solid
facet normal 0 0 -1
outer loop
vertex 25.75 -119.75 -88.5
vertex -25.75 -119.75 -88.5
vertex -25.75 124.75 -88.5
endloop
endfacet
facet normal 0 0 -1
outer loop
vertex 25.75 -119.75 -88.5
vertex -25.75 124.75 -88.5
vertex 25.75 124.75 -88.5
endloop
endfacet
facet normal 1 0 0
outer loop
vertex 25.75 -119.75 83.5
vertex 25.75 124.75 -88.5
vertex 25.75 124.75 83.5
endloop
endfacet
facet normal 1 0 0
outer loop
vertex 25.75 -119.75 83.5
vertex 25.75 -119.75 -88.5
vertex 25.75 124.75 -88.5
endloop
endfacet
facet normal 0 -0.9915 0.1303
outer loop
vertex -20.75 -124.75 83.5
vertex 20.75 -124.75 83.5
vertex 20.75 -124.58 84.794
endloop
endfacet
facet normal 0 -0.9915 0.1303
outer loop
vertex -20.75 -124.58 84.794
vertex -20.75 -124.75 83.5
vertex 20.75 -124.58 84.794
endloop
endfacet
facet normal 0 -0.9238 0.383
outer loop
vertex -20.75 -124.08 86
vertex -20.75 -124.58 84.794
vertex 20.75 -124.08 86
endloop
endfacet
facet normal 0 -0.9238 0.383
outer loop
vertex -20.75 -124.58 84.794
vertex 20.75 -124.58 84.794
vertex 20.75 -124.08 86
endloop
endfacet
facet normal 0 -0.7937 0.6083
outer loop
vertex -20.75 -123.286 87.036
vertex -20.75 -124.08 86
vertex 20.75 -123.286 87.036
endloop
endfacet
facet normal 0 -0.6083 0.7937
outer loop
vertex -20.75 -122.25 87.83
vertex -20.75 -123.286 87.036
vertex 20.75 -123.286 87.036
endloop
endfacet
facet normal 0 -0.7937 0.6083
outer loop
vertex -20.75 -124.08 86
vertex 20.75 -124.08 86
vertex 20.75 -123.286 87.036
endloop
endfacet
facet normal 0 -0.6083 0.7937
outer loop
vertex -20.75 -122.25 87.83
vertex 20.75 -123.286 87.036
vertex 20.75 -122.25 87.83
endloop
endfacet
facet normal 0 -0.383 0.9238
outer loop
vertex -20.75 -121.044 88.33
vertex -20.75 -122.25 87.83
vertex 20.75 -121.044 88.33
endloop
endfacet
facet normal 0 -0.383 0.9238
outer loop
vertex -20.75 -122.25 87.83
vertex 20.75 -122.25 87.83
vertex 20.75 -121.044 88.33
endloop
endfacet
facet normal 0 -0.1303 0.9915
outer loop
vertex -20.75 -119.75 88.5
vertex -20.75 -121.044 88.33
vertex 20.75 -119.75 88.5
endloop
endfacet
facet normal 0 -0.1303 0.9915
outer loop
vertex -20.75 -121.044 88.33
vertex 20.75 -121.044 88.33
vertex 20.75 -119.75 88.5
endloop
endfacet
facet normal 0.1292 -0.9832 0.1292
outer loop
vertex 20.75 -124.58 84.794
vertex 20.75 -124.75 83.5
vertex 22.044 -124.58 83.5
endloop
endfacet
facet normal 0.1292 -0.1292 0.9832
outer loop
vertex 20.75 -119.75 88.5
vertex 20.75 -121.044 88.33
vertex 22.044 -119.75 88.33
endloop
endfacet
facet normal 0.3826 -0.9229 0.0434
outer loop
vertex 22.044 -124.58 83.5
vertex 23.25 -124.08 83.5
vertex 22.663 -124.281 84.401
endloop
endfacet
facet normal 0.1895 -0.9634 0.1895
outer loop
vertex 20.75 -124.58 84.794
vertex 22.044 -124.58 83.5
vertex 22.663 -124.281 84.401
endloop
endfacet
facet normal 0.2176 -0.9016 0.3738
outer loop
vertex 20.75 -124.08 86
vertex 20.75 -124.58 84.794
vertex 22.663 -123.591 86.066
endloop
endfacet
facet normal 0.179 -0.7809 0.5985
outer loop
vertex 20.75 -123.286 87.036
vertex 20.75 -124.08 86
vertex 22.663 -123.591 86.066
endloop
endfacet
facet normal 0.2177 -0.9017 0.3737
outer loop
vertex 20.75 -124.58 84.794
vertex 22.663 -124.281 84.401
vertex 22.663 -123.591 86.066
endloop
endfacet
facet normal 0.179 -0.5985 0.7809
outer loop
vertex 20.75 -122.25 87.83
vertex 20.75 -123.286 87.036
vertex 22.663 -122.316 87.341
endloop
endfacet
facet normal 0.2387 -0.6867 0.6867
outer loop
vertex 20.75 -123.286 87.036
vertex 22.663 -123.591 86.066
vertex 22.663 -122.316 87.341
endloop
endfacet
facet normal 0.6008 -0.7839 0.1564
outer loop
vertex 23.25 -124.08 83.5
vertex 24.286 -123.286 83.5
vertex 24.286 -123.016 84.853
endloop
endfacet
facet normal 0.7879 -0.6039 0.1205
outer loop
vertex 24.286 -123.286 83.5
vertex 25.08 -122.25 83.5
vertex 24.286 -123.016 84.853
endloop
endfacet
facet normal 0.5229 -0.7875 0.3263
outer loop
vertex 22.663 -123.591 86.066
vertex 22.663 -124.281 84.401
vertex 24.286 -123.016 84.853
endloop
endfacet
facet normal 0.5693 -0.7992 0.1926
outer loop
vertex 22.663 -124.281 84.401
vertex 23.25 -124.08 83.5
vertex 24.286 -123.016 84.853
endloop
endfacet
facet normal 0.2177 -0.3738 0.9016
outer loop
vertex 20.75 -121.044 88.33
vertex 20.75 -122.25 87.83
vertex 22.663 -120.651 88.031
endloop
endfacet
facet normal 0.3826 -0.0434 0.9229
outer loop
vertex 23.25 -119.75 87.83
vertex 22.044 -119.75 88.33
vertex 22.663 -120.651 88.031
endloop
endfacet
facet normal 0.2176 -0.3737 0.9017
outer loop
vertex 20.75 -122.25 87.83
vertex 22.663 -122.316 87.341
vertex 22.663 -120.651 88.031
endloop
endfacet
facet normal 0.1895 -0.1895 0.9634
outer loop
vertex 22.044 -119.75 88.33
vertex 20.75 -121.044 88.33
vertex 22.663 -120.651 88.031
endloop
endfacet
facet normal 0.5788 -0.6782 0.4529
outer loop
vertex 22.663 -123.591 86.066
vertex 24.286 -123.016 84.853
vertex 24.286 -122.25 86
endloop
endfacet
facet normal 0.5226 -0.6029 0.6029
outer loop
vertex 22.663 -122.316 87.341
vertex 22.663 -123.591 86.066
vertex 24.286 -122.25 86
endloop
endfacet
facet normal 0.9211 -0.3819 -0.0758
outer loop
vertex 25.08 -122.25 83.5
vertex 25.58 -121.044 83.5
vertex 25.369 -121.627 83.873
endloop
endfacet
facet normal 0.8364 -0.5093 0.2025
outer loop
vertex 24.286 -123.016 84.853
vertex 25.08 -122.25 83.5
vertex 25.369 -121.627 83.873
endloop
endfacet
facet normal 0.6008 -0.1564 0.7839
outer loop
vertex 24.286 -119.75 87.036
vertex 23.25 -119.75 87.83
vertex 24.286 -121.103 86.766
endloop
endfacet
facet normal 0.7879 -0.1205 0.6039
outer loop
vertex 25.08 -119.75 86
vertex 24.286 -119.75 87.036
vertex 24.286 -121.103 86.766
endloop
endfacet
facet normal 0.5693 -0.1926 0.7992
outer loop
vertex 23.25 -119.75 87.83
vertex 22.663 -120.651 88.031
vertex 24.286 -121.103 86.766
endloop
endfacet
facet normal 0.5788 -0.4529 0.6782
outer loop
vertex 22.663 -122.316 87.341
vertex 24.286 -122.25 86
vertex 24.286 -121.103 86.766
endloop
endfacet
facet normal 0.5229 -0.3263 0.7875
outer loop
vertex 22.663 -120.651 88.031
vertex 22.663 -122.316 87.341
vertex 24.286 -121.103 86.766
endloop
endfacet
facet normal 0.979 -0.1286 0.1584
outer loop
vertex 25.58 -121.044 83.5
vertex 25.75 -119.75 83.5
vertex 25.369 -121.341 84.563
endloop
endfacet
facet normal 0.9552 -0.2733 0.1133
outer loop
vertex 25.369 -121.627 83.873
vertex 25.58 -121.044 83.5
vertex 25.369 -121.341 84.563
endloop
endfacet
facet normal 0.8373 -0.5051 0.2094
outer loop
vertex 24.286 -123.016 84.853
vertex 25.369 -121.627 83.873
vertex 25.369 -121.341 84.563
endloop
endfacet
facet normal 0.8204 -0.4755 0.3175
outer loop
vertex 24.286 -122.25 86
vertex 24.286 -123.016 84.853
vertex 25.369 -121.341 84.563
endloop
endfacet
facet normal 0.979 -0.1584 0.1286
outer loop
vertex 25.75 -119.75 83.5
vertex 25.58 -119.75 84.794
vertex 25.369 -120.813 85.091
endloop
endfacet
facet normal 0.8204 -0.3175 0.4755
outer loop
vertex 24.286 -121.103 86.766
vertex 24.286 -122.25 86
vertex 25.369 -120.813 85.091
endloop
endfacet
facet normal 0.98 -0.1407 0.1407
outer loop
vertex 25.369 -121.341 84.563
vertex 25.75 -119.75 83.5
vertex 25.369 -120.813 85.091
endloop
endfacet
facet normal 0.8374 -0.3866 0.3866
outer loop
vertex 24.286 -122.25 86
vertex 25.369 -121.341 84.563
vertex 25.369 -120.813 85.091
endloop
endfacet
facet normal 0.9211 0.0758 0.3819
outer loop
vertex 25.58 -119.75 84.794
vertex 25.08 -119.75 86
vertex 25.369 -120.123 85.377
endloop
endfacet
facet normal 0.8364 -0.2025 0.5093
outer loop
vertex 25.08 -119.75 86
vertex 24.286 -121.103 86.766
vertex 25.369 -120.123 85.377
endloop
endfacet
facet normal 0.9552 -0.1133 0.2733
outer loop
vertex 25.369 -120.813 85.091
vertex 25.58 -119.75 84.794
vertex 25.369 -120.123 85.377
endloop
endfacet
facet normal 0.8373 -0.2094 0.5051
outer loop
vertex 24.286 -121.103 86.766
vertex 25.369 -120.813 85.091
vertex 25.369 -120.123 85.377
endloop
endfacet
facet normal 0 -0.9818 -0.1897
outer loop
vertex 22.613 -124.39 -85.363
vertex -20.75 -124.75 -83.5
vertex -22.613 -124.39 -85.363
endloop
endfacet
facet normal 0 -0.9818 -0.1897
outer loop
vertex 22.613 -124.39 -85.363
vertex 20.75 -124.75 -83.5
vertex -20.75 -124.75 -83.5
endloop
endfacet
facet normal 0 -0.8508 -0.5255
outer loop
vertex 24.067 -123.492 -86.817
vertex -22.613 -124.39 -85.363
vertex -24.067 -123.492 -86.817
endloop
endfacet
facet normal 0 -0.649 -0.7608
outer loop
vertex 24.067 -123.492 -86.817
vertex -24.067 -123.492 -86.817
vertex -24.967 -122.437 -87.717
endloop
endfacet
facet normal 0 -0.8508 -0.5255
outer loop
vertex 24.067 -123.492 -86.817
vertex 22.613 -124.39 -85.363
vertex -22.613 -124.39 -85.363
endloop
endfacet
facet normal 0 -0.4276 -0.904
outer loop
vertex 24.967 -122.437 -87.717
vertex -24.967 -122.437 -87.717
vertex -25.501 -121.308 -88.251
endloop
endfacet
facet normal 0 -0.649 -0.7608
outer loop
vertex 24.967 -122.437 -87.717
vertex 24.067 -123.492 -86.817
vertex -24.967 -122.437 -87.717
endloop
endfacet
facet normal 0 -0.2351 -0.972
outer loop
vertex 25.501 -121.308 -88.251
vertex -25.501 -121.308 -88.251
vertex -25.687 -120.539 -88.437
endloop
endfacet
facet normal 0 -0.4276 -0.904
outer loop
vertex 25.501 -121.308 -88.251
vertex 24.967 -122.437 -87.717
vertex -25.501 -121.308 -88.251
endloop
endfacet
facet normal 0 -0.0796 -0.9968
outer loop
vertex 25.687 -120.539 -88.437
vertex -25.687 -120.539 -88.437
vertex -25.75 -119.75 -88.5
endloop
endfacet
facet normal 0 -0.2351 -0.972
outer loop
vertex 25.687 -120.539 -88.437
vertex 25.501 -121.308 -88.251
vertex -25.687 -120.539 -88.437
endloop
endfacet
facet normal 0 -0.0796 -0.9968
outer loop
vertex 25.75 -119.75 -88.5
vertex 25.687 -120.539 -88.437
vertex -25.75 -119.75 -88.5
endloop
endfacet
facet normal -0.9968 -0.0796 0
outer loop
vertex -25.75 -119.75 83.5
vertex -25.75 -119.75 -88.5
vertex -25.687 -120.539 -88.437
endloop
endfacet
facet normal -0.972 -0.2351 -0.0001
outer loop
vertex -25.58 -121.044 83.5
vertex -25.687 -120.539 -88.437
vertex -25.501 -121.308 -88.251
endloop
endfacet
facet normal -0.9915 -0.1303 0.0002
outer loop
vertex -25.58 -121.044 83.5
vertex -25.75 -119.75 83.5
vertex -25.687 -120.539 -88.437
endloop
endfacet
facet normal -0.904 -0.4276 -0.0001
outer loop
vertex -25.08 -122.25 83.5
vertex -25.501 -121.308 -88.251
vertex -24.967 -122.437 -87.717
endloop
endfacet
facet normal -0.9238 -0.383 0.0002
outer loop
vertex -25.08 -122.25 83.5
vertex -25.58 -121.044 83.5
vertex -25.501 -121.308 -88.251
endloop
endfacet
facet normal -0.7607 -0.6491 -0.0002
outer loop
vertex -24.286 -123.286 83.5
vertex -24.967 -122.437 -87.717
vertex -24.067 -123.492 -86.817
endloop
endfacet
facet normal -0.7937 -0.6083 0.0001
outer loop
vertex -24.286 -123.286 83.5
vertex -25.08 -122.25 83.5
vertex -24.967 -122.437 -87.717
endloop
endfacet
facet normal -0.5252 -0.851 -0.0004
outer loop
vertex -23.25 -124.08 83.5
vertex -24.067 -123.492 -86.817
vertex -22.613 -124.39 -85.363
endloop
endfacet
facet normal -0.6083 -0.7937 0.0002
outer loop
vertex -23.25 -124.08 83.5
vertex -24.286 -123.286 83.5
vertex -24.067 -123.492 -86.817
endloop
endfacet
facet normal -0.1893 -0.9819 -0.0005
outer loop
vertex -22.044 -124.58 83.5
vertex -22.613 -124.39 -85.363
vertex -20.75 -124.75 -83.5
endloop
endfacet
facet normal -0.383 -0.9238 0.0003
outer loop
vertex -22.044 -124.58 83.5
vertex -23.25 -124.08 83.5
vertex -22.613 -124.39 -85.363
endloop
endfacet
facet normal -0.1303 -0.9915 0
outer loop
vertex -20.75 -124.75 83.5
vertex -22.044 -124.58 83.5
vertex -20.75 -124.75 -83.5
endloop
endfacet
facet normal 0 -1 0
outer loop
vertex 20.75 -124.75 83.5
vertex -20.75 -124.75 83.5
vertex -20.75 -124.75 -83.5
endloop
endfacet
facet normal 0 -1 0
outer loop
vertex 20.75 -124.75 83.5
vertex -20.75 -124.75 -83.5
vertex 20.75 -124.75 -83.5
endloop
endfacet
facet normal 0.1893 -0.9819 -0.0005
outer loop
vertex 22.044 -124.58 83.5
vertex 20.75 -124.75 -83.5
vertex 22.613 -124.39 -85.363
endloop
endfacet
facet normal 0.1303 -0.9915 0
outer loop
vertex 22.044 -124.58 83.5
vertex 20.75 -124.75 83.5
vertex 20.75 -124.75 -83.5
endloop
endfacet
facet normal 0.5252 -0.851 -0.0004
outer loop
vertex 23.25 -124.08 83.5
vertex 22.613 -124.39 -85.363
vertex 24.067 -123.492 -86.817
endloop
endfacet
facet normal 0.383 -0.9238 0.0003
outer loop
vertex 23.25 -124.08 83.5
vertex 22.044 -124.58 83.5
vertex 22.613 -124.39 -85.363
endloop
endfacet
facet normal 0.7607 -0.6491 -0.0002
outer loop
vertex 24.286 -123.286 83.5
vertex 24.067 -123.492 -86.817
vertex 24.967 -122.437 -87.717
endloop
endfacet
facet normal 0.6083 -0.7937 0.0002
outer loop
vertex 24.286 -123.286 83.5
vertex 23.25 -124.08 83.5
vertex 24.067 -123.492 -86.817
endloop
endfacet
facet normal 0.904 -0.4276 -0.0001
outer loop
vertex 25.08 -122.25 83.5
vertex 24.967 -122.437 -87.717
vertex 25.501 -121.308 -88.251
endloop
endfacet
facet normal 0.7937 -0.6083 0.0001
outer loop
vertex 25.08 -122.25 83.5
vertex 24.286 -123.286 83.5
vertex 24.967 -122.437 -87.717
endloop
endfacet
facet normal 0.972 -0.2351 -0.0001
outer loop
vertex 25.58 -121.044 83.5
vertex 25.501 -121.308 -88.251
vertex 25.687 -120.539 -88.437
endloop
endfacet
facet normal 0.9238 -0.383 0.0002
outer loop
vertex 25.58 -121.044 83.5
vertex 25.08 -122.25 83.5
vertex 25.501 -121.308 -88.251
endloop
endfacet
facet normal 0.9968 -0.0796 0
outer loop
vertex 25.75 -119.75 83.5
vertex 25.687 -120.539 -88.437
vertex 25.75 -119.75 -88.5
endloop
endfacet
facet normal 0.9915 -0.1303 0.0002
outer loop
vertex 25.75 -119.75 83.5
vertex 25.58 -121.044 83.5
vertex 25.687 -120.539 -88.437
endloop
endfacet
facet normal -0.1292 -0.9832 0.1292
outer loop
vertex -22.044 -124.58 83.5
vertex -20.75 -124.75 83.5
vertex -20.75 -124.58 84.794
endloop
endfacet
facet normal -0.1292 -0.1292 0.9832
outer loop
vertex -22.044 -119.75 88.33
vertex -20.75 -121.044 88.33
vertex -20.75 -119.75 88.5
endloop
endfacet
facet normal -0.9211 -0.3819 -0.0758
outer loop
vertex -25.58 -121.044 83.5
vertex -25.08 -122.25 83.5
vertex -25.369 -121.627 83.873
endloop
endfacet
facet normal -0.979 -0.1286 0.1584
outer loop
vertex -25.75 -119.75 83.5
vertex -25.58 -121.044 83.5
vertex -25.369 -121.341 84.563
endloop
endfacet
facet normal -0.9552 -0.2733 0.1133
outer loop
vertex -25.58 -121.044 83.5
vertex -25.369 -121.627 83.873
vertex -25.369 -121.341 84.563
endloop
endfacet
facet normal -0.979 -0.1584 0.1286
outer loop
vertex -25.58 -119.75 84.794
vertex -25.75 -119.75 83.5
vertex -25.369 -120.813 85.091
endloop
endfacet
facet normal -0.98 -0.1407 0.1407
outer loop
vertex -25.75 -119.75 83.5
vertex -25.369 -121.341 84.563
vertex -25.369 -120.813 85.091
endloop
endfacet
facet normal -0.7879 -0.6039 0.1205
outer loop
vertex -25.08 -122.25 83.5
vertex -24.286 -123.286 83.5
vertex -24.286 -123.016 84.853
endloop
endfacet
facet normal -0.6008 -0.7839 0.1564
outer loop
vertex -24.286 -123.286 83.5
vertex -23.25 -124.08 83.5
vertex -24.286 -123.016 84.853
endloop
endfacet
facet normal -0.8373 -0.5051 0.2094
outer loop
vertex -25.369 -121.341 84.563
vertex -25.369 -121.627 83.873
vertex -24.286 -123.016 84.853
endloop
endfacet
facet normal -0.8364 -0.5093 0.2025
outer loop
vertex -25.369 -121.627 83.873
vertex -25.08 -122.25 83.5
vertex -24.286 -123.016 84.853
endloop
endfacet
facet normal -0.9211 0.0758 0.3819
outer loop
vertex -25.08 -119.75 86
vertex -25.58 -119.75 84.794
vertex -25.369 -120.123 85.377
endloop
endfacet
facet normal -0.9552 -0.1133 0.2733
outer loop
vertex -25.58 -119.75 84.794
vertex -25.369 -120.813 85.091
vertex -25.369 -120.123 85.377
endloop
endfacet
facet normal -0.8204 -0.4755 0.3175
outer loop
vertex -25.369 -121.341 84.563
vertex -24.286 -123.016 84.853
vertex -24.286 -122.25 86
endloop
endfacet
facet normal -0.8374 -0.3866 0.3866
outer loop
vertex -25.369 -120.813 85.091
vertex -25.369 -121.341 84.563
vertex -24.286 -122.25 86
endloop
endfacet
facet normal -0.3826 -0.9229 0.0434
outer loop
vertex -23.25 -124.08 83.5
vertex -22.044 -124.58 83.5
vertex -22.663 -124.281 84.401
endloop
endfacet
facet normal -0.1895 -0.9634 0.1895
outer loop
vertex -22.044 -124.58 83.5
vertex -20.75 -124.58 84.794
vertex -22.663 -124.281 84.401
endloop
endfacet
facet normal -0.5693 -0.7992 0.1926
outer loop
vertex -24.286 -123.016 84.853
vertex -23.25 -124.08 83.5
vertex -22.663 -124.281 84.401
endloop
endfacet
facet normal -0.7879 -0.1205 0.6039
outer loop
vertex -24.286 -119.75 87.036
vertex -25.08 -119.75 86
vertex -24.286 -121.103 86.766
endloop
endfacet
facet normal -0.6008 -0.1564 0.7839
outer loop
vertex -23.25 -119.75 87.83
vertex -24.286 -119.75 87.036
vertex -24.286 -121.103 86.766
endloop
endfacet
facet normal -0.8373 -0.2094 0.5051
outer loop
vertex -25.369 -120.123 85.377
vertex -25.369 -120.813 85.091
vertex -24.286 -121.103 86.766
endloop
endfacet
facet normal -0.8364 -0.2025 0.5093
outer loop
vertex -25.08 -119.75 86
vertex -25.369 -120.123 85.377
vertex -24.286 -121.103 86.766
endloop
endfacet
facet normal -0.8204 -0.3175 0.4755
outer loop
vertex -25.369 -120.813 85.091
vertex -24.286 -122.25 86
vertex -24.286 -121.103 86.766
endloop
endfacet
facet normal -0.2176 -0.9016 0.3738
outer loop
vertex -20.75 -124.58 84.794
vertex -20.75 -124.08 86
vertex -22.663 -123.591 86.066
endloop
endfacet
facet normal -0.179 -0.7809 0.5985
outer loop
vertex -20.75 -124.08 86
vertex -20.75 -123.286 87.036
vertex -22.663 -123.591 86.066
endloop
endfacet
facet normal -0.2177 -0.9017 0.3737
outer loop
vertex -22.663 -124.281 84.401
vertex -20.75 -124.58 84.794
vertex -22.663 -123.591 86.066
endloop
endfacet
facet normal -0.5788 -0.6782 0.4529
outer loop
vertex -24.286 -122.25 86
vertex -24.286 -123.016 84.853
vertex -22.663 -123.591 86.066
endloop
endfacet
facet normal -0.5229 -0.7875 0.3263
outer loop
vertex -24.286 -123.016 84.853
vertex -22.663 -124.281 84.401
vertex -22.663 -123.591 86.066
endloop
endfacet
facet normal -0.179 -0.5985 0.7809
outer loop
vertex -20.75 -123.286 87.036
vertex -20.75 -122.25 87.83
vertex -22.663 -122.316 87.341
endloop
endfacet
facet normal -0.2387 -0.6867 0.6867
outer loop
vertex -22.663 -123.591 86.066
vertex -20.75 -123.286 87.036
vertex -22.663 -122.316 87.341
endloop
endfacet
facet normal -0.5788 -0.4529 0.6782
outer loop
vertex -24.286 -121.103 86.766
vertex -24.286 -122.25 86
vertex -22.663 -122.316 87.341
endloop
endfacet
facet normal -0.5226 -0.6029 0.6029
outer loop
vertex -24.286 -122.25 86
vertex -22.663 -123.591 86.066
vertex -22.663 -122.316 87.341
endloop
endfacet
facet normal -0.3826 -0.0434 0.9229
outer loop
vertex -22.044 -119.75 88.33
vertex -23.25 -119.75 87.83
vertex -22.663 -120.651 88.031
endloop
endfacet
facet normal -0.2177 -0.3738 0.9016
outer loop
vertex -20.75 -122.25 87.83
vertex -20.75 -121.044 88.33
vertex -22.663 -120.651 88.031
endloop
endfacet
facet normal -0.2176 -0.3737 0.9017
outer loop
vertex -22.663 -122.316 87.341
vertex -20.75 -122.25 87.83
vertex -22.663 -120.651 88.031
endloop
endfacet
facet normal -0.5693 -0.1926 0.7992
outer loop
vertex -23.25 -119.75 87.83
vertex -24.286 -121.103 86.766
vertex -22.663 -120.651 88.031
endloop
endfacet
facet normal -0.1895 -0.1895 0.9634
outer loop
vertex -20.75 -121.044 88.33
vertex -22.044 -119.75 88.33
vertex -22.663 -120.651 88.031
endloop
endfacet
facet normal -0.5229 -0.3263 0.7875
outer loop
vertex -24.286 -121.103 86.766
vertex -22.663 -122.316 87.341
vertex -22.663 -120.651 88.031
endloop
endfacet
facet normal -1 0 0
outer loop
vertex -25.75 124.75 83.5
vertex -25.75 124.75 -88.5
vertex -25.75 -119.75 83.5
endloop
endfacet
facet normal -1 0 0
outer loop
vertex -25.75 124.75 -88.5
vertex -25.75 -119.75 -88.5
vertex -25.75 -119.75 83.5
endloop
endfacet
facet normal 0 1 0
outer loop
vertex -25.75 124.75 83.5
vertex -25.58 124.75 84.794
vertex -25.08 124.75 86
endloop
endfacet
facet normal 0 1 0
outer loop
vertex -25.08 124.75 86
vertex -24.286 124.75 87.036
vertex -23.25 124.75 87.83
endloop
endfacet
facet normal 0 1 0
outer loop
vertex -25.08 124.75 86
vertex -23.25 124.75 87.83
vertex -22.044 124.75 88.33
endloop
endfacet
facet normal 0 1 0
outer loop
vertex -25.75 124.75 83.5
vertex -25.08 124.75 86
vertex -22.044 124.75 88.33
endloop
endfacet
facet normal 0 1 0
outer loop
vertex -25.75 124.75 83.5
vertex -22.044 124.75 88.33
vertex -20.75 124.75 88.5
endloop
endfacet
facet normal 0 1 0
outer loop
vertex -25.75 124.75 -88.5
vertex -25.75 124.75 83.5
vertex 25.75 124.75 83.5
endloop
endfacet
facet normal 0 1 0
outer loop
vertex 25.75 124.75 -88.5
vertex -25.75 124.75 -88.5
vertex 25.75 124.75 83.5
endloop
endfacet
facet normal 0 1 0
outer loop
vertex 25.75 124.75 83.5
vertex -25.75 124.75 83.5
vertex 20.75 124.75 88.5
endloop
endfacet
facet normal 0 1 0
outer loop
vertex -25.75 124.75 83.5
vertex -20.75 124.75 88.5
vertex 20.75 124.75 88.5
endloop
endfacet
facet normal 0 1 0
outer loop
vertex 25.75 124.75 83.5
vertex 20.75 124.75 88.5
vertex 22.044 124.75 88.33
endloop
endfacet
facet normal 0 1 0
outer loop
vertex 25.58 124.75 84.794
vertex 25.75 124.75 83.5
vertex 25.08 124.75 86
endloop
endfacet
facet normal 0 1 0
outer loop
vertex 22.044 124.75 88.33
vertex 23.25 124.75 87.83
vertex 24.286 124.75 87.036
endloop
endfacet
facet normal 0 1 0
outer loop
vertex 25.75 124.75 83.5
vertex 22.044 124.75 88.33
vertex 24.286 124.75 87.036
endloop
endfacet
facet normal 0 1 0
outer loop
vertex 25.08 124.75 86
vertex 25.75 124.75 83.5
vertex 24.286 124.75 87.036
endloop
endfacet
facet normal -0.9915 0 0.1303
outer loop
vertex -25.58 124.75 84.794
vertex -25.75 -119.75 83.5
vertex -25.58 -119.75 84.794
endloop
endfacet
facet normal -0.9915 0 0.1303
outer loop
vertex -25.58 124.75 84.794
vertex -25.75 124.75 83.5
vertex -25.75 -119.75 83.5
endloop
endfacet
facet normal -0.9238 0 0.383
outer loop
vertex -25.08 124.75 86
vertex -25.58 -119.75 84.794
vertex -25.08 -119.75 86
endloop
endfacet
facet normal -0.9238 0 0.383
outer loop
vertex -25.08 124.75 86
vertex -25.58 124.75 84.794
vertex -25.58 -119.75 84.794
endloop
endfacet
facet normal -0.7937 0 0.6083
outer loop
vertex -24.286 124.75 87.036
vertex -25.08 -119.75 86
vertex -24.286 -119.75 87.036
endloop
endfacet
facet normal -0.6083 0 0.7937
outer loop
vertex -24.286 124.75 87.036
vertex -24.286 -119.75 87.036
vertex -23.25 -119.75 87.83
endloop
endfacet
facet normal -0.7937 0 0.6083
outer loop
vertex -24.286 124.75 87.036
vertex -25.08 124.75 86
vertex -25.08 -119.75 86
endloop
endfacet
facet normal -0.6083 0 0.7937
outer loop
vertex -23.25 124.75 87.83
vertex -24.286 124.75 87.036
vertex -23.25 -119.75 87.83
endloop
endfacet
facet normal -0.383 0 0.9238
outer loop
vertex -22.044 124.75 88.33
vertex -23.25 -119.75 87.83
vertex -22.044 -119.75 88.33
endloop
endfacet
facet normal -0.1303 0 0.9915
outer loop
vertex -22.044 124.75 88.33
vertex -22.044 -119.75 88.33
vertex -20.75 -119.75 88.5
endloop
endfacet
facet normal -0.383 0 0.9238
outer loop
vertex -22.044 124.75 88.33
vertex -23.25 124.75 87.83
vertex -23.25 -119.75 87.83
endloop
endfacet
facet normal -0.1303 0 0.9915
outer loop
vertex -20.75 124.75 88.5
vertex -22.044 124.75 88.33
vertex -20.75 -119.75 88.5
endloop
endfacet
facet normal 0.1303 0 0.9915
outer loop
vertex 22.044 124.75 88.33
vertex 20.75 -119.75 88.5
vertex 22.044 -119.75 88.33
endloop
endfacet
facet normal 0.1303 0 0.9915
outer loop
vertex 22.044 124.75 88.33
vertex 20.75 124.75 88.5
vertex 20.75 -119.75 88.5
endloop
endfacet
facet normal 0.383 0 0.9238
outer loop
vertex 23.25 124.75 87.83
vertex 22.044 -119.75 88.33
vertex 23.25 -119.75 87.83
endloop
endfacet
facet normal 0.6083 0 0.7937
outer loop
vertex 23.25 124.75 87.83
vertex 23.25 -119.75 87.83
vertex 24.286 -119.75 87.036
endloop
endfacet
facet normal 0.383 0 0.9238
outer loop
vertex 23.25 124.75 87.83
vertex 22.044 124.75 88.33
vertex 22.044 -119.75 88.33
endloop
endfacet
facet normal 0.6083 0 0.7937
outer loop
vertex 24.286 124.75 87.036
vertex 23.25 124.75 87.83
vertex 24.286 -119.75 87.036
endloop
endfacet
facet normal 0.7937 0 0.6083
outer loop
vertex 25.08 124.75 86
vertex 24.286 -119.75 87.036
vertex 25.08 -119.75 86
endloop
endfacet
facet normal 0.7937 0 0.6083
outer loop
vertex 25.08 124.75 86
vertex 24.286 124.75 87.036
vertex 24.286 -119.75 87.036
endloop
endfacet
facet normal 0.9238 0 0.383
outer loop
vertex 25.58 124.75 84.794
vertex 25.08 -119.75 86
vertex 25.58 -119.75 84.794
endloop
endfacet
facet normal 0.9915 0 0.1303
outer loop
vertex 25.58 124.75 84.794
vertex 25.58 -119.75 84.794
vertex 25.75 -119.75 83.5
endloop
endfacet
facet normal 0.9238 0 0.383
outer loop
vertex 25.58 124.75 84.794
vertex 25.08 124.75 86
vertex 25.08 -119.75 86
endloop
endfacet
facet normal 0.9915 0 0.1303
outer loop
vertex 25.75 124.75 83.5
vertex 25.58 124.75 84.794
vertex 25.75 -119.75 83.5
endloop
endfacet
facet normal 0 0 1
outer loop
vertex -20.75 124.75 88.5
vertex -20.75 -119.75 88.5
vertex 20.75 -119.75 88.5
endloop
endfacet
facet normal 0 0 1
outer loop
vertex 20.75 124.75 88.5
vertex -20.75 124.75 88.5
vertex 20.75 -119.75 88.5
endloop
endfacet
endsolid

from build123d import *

# Parameters (mm, degrees)
F0_W     = 51.5
F0_H     = 177
F1_DEPTH = 124.75
F2_R     = 5
F3_R     = 5
F4_DEPTH = 25
F5_DEPTH = 40.6


with BuildPart() as f1:
    # F0 (on Front) → F1 (new body, symmetric)
    with BuildSketch(Plane.XZ):
        Rectangle(F0_W, F0_H)
    extrude(amount=F1_DEPTH, both=True)

    # F2
    f2_edges = [f1.edges().sort_by_distance(p)[0] for p in [
        (0, -124.75, 88.5),
    ]]
    fillet(f2_edges, radius=F2_R)

    # F3
    f3_edges = [f1.edges().sort_by_distance(p)[0] for p in [
        (25.75, -124.75, -2.5),
        (0, -124.75, 83.5),
        (0, -124.75, -88.5),
        (-25.75, -124.75, -2.5),
    ]]
    fillet(f3_edges, radius=F3_R)

    # F4 (add): a face of the model
    f4_faces = [f1.faces().sort_by_distance(p)[0] for p in [
        (0, -124.75, 0),
    ]]
    extrude(f4_faces, amount=-F4_DEPTH)

    # F5 (add): a face of the model
    f5_faces = [f1.faces().sort_by_distance(p)[0] for p in [
        (0, -124.75, 0),
    ]]
    extrude(f5_faces, amount=-F5_DEPTH)


solid = f1.part
